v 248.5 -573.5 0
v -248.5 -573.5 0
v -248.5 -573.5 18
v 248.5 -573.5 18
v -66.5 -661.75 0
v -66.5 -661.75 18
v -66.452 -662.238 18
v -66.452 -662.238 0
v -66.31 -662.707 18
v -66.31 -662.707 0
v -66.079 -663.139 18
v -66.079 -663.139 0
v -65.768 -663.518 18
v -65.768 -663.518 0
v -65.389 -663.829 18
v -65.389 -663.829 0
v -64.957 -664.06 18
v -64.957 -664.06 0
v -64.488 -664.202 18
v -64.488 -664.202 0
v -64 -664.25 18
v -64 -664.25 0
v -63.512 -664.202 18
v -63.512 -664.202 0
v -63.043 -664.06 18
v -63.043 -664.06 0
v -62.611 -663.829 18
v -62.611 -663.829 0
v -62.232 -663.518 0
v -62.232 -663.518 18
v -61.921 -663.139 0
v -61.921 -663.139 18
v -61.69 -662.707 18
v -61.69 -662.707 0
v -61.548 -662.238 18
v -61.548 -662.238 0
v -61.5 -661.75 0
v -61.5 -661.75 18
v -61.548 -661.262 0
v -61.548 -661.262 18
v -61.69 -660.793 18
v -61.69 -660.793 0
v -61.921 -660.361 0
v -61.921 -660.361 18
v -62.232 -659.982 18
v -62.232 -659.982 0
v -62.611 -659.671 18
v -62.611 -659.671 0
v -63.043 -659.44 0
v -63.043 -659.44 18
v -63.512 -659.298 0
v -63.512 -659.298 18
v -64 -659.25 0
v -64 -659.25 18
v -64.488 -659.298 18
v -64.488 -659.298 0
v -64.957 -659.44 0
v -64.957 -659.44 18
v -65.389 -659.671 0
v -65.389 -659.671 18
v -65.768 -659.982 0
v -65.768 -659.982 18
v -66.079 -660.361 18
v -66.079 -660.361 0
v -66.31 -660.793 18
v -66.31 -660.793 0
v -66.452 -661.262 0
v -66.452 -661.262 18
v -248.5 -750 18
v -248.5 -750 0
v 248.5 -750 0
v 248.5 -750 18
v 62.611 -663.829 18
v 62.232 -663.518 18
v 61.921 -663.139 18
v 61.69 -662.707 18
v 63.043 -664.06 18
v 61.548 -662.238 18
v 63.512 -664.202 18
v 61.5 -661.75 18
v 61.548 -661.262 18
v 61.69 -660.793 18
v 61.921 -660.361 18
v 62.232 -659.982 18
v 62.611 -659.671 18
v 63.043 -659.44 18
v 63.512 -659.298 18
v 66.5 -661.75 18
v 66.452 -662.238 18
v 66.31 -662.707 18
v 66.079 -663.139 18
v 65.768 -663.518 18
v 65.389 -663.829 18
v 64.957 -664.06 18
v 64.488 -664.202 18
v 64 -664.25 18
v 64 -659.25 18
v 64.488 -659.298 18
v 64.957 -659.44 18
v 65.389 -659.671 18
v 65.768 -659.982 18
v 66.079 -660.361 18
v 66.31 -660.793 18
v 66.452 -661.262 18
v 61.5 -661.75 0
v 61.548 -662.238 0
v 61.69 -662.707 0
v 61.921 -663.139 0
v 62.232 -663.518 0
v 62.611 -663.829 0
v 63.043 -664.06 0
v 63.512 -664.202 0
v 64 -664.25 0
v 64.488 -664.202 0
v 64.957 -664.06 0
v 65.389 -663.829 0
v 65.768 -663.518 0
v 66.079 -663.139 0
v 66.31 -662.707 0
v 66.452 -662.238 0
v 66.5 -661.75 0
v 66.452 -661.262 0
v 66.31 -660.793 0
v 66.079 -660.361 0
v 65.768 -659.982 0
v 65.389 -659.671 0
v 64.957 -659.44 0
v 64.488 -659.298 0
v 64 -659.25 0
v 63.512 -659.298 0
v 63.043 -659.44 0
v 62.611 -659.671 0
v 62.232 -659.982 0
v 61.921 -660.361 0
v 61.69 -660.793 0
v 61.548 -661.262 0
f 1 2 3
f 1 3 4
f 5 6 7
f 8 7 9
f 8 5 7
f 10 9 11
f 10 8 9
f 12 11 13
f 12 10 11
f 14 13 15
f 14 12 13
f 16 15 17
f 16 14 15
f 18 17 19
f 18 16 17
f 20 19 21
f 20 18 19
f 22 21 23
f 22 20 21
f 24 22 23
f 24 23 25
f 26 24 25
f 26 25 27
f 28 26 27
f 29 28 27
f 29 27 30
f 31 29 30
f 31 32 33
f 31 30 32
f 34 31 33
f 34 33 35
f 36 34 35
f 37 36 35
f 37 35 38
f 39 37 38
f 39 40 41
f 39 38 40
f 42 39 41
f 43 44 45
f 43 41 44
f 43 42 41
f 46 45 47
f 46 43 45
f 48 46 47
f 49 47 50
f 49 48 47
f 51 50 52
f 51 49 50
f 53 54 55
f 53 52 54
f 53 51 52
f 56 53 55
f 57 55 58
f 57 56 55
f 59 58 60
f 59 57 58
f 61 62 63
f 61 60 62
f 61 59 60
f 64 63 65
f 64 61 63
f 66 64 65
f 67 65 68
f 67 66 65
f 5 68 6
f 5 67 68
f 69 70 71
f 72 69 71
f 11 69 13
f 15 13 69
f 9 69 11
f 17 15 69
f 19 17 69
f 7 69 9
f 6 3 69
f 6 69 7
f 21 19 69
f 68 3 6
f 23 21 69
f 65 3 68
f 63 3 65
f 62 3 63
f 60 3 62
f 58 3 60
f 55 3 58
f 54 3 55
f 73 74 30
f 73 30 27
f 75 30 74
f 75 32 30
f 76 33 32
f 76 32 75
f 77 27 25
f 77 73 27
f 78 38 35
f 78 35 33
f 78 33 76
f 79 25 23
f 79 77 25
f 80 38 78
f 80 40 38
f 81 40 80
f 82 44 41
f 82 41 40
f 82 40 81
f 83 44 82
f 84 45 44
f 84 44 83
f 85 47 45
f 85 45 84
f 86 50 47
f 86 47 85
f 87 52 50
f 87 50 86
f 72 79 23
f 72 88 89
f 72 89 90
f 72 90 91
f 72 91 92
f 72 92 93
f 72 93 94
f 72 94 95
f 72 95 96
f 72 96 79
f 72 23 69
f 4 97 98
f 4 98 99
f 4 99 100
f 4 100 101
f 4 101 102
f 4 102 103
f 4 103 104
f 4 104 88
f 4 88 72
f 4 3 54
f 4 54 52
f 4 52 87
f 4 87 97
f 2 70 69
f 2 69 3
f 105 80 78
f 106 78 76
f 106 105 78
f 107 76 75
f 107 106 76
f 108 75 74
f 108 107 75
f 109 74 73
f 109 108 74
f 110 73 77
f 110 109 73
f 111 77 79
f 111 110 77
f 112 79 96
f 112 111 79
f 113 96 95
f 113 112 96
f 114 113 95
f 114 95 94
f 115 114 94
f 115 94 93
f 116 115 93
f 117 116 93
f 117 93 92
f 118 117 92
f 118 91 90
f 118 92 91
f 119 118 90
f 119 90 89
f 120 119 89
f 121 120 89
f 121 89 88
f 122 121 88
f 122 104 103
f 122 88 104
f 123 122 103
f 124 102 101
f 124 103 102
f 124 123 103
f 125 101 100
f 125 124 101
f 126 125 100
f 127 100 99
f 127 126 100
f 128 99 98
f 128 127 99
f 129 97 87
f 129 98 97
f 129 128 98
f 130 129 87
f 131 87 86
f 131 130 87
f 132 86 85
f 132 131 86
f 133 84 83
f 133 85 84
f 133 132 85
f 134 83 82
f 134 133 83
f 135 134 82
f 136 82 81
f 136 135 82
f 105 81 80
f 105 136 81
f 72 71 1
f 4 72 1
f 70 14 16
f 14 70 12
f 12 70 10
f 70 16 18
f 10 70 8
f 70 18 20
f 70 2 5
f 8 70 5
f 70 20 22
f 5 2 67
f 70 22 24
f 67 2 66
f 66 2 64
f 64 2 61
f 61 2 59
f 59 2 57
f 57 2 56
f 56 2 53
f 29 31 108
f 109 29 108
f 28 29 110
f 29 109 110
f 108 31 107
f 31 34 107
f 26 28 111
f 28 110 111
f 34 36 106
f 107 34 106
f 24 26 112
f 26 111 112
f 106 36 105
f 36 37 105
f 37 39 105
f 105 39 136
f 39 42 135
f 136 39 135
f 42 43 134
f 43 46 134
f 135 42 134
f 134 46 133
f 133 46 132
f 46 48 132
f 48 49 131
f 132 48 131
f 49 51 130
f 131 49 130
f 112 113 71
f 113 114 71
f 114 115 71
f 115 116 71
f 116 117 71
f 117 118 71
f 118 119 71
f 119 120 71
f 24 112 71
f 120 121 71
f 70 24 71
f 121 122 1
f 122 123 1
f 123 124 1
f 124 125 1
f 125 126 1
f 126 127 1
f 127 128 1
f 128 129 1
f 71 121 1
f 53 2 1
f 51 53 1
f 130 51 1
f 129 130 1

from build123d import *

# Parameters (mm, degrees)
SKETCH1_W           = 497
SKETCH1_H           = 176.5
BOSS_EXTRUDE1_DEPTH = 18
SKETCH3_R           = 2.5
CUT_EXTRUDE2_DEPTH  = 61


with BuildPart() as part:
    # Sketch1 → Boss-Extrude1 (new body)
    with BuildSketch(Plane.XY):
        with Locations((0, -661.75)):
            Rectangle(SKETCH1_W, SKETCH1_H)
    extrude(amount=BOSS_EXTRUDE1_DEPTH)

    # Sketch3 → Cut-Extrude2 (cut)
    with BuildSketch(Plane.XY):
        with Locations(Location((64, -661.75, 0), (0, 0, 180))):
            Circle(SKETCH3_R)
        with Locations(Location((-64, -661.75, 0), (0, 0, 180))):
            Circle(SKETCH3_R)
    extrude(amount=CUT_EXTRUDE2_DEPTH, mode=Mode.SUBTRACT)


solid = part.part
